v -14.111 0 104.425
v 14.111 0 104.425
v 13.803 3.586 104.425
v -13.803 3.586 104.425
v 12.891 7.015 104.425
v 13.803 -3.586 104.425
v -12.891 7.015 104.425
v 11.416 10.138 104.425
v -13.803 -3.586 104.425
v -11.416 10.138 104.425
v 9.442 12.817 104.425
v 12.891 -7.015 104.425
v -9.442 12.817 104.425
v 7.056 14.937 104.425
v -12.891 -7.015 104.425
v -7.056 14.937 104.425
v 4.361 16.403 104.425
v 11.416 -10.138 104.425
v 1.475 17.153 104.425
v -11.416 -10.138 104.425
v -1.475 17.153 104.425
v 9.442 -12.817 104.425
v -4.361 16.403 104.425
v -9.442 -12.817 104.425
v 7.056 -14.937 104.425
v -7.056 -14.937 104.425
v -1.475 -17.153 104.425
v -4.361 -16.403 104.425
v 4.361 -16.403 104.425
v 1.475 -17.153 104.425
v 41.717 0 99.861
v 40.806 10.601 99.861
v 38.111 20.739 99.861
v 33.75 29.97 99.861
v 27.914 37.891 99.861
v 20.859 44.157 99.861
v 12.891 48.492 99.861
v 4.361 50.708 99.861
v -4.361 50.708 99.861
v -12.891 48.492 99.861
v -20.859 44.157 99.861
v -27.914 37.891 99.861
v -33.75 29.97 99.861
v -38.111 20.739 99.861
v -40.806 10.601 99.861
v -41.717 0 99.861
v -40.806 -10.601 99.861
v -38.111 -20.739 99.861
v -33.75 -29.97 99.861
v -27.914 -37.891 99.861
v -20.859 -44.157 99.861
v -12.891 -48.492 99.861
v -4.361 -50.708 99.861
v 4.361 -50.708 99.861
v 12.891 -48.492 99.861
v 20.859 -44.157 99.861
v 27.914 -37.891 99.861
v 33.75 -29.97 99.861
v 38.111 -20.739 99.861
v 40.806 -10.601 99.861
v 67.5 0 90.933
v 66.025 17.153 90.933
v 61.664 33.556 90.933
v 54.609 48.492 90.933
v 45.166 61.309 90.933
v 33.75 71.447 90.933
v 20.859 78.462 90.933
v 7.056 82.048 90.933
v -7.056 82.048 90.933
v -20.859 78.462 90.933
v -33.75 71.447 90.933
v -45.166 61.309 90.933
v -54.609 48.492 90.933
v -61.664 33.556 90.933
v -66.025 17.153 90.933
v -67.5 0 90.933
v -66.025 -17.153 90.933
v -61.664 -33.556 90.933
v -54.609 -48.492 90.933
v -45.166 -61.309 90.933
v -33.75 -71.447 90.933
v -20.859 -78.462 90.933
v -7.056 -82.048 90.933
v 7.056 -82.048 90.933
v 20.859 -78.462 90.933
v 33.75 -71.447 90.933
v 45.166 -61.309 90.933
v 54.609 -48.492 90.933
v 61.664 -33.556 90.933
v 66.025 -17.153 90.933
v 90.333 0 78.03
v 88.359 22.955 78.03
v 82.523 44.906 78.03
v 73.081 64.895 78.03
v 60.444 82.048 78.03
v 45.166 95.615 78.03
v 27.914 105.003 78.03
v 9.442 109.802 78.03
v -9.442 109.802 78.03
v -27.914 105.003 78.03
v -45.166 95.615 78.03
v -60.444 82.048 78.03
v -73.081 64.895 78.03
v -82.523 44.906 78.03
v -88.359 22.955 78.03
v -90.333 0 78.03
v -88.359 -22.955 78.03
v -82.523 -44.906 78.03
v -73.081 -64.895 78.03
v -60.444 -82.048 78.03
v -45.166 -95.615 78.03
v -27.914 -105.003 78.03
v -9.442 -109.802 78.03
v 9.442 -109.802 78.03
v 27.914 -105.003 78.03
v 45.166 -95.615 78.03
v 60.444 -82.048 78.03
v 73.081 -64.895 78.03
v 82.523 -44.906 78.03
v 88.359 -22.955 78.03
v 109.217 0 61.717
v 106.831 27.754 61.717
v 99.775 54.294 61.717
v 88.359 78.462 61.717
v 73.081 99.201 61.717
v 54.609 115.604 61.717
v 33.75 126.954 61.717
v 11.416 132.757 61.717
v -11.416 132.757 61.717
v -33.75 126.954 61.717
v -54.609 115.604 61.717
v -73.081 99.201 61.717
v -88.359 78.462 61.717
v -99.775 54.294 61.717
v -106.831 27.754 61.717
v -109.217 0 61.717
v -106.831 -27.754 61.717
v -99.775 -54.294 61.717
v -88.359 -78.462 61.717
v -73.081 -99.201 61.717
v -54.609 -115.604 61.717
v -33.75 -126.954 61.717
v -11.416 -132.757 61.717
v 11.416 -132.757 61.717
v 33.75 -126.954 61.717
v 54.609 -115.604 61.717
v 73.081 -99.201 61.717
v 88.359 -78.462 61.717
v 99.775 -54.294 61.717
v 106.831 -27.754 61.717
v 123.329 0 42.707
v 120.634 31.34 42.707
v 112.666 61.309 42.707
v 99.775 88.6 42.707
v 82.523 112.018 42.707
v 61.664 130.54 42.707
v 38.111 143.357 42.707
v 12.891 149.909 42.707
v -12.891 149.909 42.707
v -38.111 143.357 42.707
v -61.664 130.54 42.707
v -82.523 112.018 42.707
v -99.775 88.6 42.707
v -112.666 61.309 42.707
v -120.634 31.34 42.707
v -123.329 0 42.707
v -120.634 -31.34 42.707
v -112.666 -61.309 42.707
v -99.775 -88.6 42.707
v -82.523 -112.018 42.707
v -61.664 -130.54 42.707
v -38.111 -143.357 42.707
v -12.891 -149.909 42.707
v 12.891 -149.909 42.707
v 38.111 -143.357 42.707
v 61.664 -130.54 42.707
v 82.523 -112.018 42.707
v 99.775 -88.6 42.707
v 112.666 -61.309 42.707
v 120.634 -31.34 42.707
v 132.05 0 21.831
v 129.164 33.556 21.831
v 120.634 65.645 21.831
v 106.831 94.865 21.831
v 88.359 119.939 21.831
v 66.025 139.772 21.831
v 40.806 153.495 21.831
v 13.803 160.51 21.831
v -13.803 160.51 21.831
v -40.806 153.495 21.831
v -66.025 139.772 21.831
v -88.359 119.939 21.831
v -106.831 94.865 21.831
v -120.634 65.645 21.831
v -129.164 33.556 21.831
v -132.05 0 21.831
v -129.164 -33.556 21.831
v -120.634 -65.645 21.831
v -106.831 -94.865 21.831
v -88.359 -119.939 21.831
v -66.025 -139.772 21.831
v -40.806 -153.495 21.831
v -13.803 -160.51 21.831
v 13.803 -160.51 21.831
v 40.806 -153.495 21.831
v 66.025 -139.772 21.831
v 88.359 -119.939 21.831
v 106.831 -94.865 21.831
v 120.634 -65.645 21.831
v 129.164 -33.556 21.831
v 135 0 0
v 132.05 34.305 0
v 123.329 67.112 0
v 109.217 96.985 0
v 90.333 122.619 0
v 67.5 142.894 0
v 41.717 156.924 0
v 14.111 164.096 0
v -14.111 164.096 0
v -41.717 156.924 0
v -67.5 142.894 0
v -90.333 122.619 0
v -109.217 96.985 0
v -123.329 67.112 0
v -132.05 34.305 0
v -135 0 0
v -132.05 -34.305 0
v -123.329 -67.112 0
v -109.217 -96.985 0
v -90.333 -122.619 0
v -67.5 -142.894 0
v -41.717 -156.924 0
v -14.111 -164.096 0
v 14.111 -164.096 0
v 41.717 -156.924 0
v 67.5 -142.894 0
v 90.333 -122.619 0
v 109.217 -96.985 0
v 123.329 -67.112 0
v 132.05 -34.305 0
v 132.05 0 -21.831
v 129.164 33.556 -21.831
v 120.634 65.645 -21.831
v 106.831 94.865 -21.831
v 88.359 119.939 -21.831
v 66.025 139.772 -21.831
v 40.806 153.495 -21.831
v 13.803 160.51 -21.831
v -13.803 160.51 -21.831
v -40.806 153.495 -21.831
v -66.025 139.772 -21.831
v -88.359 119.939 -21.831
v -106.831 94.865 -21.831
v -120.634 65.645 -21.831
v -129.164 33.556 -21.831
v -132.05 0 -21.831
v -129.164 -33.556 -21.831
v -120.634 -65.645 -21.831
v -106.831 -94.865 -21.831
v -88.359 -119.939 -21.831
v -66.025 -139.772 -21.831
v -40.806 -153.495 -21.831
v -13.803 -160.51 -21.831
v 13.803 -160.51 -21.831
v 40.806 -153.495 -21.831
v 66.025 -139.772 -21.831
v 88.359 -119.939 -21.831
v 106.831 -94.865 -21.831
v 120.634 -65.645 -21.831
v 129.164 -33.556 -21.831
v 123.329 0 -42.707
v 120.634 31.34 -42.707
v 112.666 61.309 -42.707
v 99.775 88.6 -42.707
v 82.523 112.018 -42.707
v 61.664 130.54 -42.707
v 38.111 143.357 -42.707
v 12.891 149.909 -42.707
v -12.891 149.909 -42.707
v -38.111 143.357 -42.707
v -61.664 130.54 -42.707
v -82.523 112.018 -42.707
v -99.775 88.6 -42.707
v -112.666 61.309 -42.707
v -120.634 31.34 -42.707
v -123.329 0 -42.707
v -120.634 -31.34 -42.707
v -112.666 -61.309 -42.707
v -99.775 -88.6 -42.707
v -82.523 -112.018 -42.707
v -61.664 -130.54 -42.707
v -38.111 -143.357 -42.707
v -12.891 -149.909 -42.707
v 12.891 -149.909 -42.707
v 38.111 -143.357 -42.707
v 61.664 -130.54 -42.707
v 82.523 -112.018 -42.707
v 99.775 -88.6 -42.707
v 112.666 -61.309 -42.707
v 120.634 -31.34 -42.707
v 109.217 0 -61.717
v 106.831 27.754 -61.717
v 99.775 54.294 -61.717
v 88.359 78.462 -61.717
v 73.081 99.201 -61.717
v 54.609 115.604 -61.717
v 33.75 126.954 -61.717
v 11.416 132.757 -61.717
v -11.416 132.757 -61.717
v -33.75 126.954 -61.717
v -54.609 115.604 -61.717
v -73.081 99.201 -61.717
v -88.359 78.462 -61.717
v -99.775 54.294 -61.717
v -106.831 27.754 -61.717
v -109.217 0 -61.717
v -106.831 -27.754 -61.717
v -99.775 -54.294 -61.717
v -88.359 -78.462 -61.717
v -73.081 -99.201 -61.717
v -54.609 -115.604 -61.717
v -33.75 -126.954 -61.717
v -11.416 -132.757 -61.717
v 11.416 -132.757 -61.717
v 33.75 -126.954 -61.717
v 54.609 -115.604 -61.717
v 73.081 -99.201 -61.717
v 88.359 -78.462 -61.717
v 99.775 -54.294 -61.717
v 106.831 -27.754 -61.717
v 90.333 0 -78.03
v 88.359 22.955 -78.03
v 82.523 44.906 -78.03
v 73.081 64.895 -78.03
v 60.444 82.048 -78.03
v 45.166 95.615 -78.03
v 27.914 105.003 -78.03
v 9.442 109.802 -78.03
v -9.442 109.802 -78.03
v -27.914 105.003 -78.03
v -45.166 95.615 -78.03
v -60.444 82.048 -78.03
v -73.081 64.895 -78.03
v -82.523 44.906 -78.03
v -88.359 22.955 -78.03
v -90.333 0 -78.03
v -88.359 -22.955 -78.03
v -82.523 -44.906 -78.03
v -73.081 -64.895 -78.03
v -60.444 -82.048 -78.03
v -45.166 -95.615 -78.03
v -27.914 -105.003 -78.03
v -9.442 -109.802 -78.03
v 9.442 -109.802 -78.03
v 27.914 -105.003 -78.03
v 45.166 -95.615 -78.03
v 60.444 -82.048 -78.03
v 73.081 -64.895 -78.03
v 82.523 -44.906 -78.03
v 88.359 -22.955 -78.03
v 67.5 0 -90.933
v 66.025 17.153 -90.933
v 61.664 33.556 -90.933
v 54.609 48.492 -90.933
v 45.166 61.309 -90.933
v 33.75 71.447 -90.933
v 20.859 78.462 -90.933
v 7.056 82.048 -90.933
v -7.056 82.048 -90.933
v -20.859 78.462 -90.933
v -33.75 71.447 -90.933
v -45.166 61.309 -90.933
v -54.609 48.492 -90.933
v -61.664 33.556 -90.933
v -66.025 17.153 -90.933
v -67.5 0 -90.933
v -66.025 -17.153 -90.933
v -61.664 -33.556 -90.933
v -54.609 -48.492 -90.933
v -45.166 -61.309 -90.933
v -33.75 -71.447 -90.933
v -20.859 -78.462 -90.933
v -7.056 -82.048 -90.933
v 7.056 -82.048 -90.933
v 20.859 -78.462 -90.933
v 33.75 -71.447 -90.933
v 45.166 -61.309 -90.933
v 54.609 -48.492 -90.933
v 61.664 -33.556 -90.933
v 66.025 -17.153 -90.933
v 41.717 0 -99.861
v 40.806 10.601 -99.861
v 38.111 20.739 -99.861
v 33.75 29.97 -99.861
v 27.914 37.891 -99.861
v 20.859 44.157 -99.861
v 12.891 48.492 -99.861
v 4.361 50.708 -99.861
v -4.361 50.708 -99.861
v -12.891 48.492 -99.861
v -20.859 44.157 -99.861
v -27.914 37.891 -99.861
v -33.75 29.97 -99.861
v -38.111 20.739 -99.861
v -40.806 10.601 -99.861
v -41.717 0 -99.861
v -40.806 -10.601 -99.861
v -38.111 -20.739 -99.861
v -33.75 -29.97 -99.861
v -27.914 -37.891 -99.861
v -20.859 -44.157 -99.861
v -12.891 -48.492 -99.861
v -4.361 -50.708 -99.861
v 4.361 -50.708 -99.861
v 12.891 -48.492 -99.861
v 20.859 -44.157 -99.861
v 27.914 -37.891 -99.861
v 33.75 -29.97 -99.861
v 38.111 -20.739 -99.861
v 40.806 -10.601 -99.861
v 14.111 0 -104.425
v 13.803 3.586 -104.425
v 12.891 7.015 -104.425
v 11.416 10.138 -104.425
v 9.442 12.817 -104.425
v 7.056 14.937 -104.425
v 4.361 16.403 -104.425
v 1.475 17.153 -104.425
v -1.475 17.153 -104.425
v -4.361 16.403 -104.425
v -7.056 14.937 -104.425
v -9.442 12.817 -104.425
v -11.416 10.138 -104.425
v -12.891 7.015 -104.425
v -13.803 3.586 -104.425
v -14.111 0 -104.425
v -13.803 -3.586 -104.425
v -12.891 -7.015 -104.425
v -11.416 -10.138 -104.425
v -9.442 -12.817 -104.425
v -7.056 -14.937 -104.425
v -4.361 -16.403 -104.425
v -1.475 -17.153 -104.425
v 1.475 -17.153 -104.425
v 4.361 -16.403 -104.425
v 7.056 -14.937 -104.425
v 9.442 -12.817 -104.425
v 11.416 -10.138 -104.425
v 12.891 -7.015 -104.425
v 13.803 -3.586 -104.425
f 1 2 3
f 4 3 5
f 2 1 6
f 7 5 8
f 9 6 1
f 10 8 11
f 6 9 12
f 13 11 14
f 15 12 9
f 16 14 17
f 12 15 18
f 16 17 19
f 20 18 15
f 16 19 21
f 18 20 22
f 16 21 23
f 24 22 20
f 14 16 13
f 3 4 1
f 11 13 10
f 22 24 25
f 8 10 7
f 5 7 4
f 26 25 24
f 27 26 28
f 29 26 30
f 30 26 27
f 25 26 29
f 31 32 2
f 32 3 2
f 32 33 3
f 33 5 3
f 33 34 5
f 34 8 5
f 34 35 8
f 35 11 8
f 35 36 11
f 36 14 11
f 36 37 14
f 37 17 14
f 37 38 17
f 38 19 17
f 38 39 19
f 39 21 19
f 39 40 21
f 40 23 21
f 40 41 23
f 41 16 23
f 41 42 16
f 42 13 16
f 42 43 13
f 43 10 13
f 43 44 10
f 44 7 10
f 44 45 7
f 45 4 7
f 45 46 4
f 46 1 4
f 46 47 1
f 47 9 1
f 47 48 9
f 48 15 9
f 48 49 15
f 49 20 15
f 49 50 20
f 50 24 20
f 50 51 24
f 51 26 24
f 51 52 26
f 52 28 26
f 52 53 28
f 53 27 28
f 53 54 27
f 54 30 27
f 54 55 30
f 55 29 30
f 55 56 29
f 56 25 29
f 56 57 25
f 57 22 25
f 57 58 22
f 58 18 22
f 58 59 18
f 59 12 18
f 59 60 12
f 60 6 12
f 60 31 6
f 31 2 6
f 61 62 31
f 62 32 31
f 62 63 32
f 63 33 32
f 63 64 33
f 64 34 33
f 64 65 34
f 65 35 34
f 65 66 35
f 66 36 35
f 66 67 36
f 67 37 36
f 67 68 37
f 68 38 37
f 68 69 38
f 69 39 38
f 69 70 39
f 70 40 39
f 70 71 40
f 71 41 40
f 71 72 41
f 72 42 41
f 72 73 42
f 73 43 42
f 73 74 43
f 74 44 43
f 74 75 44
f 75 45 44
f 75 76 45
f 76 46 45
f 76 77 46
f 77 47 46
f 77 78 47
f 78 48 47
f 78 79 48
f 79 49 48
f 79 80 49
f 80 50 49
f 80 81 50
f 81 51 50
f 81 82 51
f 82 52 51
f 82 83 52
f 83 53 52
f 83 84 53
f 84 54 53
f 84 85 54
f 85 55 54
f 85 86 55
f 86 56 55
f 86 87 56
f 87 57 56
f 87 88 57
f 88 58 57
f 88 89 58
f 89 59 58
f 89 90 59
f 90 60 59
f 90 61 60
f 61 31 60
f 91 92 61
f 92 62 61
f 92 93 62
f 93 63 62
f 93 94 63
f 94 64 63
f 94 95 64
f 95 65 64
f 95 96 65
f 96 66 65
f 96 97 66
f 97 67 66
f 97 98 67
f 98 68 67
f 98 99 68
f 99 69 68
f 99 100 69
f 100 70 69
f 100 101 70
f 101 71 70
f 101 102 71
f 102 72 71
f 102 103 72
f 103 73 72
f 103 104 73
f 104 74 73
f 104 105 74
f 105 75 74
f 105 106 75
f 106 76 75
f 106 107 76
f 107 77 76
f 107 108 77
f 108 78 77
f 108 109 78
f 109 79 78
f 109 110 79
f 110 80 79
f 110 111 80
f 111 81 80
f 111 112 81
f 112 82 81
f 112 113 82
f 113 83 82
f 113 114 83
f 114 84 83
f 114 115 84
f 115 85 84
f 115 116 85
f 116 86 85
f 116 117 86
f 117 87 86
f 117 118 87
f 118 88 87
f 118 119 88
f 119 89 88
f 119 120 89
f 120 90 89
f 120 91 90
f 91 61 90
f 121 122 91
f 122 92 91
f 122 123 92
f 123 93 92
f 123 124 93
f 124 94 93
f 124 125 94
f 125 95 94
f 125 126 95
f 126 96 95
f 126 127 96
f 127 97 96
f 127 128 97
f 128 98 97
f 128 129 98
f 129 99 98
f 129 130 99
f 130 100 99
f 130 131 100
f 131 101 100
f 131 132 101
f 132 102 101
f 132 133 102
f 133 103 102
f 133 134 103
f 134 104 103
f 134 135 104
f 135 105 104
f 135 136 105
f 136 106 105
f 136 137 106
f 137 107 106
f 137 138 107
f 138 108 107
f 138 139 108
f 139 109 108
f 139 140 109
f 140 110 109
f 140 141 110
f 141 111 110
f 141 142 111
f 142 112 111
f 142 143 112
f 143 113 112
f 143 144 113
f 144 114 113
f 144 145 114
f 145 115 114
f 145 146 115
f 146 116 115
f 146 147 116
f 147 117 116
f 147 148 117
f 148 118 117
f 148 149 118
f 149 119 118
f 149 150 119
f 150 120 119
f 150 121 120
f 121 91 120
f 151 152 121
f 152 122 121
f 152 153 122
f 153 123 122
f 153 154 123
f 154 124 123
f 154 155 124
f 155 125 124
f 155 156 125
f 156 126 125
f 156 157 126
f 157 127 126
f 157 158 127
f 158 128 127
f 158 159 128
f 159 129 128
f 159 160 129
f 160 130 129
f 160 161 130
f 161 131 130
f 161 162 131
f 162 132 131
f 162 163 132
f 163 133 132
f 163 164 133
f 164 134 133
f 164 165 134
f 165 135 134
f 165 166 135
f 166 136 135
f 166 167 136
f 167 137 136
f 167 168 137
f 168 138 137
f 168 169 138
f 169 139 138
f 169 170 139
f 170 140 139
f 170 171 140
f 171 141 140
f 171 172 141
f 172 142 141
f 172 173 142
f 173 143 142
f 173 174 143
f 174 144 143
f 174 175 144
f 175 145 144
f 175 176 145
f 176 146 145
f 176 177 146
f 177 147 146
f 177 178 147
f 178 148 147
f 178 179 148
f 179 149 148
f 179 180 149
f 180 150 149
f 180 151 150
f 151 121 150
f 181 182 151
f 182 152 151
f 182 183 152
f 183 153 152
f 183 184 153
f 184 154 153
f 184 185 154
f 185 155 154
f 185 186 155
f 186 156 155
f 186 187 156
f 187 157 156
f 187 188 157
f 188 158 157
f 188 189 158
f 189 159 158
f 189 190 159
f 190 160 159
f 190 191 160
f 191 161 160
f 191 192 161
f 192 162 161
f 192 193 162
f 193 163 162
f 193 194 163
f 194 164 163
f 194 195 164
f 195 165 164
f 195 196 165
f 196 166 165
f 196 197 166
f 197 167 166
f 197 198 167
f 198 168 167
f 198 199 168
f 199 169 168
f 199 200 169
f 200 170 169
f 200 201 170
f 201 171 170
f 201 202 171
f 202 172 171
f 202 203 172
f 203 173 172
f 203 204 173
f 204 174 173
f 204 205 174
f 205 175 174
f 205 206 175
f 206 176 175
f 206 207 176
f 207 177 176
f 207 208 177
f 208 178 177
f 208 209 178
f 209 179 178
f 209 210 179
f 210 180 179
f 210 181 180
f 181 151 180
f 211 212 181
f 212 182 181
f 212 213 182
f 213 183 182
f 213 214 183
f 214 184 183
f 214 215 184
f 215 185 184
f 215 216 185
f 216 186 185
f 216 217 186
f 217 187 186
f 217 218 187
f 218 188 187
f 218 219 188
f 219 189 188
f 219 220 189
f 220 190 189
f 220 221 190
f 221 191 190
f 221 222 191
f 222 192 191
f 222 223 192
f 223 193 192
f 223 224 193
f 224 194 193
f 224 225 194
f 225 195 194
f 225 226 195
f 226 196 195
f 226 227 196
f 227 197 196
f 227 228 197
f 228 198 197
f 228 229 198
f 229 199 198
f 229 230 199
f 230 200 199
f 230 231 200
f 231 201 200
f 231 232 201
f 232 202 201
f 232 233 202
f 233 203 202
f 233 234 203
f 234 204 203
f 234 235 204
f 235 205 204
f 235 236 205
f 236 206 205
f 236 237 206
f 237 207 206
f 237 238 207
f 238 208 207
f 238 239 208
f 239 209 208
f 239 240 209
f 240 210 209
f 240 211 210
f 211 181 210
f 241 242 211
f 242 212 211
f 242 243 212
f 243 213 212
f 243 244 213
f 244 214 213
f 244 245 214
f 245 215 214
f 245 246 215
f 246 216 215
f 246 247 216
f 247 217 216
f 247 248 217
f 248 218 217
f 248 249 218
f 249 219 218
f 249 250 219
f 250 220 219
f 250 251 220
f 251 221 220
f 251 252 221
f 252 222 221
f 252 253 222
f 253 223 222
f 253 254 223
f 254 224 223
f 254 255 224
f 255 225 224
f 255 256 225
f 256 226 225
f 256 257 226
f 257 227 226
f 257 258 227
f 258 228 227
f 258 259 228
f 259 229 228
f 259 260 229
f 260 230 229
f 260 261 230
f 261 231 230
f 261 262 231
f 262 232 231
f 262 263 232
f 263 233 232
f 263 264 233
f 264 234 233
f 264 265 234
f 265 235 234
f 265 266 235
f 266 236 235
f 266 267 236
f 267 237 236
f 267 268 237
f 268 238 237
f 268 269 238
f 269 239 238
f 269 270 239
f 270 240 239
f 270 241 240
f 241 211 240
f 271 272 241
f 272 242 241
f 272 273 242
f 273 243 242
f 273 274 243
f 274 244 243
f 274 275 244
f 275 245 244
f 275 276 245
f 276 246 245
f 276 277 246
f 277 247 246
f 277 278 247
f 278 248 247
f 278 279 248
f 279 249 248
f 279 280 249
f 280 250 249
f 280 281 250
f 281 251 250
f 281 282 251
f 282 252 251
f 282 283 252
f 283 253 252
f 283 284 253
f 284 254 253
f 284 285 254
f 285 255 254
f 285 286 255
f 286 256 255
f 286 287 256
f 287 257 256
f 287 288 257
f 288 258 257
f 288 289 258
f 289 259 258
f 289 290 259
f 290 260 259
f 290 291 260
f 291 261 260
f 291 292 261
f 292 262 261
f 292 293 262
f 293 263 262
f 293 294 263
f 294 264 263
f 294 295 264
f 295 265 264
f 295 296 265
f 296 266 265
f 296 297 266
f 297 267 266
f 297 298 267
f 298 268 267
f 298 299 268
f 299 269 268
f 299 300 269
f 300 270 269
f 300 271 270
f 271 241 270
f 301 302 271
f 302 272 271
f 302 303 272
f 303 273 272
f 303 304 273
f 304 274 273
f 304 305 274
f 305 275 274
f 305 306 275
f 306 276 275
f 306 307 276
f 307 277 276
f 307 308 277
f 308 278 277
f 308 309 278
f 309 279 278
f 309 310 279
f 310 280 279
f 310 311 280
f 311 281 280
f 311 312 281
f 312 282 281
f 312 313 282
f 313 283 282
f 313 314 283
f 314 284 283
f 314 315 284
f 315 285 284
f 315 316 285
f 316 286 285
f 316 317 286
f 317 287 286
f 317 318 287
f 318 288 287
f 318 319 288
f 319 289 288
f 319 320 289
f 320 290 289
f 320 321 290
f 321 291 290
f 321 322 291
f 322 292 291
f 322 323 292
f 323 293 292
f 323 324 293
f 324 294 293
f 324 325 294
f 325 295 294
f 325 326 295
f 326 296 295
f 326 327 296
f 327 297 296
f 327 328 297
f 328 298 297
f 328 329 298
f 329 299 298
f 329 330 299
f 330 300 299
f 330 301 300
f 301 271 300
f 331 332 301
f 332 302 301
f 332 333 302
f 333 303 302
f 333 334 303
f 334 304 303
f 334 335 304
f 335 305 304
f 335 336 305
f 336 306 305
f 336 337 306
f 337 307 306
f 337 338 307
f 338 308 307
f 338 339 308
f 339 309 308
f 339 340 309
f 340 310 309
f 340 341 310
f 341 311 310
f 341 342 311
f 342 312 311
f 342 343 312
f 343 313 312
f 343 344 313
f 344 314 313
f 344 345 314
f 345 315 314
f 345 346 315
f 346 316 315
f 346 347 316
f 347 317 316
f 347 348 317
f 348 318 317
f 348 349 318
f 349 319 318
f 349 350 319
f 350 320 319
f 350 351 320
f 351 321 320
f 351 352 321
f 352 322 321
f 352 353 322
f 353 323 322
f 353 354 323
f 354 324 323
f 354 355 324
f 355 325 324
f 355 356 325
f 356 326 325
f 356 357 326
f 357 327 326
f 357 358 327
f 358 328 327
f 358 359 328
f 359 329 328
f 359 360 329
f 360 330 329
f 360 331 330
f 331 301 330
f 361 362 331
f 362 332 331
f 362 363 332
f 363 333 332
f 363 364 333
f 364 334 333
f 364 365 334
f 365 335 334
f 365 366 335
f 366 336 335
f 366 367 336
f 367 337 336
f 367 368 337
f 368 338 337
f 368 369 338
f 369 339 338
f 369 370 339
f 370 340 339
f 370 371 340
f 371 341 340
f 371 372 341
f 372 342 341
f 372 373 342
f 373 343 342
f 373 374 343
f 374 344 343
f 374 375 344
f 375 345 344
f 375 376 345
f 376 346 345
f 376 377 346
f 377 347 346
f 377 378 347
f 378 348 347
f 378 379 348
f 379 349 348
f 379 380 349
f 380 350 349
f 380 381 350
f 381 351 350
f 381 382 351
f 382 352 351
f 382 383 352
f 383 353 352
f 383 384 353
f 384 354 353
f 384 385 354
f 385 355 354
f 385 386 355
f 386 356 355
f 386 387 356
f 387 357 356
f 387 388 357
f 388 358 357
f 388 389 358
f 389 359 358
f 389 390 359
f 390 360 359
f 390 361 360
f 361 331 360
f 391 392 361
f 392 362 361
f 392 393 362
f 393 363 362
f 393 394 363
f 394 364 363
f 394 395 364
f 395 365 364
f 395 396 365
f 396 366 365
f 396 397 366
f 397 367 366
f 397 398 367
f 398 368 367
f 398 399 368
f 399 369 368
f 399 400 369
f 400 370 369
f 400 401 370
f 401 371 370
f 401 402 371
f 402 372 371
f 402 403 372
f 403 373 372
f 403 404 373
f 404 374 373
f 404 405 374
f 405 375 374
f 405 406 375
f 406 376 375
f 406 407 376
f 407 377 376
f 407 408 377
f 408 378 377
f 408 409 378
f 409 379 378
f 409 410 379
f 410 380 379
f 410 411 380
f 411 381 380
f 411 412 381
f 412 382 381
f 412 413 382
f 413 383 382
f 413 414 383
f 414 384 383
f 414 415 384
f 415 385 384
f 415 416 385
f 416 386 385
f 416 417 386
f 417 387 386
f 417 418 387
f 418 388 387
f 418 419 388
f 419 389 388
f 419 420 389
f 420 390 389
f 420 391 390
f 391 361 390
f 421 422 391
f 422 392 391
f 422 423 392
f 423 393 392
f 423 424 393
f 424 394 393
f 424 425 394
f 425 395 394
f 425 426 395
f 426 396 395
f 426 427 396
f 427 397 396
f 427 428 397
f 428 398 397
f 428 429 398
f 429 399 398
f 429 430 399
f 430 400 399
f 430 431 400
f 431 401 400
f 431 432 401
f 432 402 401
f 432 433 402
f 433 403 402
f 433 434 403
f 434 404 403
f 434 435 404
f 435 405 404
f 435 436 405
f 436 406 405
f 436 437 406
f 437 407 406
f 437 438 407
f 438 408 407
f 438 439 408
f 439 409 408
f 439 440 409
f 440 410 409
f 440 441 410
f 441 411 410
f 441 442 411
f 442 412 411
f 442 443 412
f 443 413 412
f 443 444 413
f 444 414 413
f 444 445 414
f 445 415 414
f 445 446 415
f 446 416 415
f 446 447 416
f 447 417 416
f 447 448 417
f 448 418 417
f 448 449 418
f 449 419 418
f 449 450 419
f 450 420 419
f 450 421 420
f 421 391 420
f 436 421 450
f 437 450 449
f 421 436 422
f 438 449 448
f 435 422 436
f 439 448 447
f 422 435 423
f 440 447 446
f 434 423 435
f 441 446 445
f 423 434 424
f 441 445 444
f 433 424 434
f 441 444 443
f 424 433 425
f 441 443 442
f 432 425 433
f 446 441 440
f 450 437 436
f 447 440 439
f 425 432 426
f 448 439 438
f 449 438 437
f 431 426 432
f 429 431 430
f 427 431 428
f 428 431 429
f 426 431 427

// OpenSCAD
// Generated by SolidPython 1.0.1 on 2020-07-29 00:46:48


scale(v = [9, 11, 7]) {
	sphere(r = 15);
}
/***********************************************
*********      SolidPython code:      **********
************************************************
 
# import packages: SolidPython
from solid import *
from solid.utils import *
from itertools import chain, combinations, permutations


class Resize:

    def __init__(self, scad_file):
        self.scad_file = scad_file
        #self.scad_file = import_scad(scad_file)
        # cone/cylinder param:
        self.r1 = 0
        self.r2 = 0
        self.h = 0
        # rectangular prism param:
        self.w = 0
        self.l = 0
        # ellipse param:
        self.r = 0

    # import OpenScad code (file name corresponds to shape)


    # classify shape + parameters
    def assign(self, param1, param2, param3):
        if self.scad_file == 'cone.scad':
            self.r1 = param1
            self.r2 = param2
            self.h = param3
        elif self.scad_file == 'cylinder.scad':
            self.r1 = param1
            self.r2 = param2
            self.h = param3
        elif self.scad_file == 'rectangularPrism.scad':
            self.h = param1
            self.l = param2
            self.w = param3
        else:
            self.r = param1
            self.h = param2

    # resize parameters
    def iterate(self):
        x = range(3, 20, 2)
        i = 1
        if self.scad_file == 'cone.scad':
            tempList = list(permutations(x, 2))
            for temp in tempList:
                param1 = temp[0]
                param2 = temp[1]
                filepath = 'produced_scad_files/' + 'cone' + str(param1) + '_' + str(param2) + '_' + '.scad'
                scad_render_to_file(cylinder(h=param1, r1=param2, r2=0), filepath)

        elif self.scad_file == 'cylinder.scad':
            tempList = list(permutations(x, 3))
            for temp in tempList:
                param1 = temp[0]
                param2 = temp[1]
                filepath = 'produced_scad_files/' + 'cylinder' + str(param1) + '_' + str(param2) + '_' + '.scad'
                scad_render_to_file(cylinder(h=param1, r1=param2, r2=param2), filepath)

        elif self.scad_file == 'rectangularPrism.scad':
            tempList = list(permutations(x, 3))
            for temp in tempList:
                param1 = temp[0]
                param2 = temp[1]
                param3 = temp[2]
                filepath = 'produced_scad_files/' + 'rectangularPrism' + str(param1) + '_' + str(param2) + '_' + str(
                    param3) + '.scad'
                scad_render_to_file(cube(size=(param1, param2, param3)), filepath)

        elif self.scad_file == 'ellipse.scad':
            tempList = list(permutations(x, 4))
            for temp in tempList:
                param1 = temp[0]
                param2 = temp[1]
                param3 = temp[2]
                param4 = temp[3]
                filepath = 'produced_scad_files/' + 'ellipse' + str(param1) + '_' + str(param2) + '_' + str(param3) + '_' + str(param4) + '.scad'
                scad_render_to_file(scale([param1, param2, param3])(sphere(r=param4)), filepath)

    def render_to_scadfile(self):
        scad_render_to_file(scad, 'example.scad') 
 
************************************************/
